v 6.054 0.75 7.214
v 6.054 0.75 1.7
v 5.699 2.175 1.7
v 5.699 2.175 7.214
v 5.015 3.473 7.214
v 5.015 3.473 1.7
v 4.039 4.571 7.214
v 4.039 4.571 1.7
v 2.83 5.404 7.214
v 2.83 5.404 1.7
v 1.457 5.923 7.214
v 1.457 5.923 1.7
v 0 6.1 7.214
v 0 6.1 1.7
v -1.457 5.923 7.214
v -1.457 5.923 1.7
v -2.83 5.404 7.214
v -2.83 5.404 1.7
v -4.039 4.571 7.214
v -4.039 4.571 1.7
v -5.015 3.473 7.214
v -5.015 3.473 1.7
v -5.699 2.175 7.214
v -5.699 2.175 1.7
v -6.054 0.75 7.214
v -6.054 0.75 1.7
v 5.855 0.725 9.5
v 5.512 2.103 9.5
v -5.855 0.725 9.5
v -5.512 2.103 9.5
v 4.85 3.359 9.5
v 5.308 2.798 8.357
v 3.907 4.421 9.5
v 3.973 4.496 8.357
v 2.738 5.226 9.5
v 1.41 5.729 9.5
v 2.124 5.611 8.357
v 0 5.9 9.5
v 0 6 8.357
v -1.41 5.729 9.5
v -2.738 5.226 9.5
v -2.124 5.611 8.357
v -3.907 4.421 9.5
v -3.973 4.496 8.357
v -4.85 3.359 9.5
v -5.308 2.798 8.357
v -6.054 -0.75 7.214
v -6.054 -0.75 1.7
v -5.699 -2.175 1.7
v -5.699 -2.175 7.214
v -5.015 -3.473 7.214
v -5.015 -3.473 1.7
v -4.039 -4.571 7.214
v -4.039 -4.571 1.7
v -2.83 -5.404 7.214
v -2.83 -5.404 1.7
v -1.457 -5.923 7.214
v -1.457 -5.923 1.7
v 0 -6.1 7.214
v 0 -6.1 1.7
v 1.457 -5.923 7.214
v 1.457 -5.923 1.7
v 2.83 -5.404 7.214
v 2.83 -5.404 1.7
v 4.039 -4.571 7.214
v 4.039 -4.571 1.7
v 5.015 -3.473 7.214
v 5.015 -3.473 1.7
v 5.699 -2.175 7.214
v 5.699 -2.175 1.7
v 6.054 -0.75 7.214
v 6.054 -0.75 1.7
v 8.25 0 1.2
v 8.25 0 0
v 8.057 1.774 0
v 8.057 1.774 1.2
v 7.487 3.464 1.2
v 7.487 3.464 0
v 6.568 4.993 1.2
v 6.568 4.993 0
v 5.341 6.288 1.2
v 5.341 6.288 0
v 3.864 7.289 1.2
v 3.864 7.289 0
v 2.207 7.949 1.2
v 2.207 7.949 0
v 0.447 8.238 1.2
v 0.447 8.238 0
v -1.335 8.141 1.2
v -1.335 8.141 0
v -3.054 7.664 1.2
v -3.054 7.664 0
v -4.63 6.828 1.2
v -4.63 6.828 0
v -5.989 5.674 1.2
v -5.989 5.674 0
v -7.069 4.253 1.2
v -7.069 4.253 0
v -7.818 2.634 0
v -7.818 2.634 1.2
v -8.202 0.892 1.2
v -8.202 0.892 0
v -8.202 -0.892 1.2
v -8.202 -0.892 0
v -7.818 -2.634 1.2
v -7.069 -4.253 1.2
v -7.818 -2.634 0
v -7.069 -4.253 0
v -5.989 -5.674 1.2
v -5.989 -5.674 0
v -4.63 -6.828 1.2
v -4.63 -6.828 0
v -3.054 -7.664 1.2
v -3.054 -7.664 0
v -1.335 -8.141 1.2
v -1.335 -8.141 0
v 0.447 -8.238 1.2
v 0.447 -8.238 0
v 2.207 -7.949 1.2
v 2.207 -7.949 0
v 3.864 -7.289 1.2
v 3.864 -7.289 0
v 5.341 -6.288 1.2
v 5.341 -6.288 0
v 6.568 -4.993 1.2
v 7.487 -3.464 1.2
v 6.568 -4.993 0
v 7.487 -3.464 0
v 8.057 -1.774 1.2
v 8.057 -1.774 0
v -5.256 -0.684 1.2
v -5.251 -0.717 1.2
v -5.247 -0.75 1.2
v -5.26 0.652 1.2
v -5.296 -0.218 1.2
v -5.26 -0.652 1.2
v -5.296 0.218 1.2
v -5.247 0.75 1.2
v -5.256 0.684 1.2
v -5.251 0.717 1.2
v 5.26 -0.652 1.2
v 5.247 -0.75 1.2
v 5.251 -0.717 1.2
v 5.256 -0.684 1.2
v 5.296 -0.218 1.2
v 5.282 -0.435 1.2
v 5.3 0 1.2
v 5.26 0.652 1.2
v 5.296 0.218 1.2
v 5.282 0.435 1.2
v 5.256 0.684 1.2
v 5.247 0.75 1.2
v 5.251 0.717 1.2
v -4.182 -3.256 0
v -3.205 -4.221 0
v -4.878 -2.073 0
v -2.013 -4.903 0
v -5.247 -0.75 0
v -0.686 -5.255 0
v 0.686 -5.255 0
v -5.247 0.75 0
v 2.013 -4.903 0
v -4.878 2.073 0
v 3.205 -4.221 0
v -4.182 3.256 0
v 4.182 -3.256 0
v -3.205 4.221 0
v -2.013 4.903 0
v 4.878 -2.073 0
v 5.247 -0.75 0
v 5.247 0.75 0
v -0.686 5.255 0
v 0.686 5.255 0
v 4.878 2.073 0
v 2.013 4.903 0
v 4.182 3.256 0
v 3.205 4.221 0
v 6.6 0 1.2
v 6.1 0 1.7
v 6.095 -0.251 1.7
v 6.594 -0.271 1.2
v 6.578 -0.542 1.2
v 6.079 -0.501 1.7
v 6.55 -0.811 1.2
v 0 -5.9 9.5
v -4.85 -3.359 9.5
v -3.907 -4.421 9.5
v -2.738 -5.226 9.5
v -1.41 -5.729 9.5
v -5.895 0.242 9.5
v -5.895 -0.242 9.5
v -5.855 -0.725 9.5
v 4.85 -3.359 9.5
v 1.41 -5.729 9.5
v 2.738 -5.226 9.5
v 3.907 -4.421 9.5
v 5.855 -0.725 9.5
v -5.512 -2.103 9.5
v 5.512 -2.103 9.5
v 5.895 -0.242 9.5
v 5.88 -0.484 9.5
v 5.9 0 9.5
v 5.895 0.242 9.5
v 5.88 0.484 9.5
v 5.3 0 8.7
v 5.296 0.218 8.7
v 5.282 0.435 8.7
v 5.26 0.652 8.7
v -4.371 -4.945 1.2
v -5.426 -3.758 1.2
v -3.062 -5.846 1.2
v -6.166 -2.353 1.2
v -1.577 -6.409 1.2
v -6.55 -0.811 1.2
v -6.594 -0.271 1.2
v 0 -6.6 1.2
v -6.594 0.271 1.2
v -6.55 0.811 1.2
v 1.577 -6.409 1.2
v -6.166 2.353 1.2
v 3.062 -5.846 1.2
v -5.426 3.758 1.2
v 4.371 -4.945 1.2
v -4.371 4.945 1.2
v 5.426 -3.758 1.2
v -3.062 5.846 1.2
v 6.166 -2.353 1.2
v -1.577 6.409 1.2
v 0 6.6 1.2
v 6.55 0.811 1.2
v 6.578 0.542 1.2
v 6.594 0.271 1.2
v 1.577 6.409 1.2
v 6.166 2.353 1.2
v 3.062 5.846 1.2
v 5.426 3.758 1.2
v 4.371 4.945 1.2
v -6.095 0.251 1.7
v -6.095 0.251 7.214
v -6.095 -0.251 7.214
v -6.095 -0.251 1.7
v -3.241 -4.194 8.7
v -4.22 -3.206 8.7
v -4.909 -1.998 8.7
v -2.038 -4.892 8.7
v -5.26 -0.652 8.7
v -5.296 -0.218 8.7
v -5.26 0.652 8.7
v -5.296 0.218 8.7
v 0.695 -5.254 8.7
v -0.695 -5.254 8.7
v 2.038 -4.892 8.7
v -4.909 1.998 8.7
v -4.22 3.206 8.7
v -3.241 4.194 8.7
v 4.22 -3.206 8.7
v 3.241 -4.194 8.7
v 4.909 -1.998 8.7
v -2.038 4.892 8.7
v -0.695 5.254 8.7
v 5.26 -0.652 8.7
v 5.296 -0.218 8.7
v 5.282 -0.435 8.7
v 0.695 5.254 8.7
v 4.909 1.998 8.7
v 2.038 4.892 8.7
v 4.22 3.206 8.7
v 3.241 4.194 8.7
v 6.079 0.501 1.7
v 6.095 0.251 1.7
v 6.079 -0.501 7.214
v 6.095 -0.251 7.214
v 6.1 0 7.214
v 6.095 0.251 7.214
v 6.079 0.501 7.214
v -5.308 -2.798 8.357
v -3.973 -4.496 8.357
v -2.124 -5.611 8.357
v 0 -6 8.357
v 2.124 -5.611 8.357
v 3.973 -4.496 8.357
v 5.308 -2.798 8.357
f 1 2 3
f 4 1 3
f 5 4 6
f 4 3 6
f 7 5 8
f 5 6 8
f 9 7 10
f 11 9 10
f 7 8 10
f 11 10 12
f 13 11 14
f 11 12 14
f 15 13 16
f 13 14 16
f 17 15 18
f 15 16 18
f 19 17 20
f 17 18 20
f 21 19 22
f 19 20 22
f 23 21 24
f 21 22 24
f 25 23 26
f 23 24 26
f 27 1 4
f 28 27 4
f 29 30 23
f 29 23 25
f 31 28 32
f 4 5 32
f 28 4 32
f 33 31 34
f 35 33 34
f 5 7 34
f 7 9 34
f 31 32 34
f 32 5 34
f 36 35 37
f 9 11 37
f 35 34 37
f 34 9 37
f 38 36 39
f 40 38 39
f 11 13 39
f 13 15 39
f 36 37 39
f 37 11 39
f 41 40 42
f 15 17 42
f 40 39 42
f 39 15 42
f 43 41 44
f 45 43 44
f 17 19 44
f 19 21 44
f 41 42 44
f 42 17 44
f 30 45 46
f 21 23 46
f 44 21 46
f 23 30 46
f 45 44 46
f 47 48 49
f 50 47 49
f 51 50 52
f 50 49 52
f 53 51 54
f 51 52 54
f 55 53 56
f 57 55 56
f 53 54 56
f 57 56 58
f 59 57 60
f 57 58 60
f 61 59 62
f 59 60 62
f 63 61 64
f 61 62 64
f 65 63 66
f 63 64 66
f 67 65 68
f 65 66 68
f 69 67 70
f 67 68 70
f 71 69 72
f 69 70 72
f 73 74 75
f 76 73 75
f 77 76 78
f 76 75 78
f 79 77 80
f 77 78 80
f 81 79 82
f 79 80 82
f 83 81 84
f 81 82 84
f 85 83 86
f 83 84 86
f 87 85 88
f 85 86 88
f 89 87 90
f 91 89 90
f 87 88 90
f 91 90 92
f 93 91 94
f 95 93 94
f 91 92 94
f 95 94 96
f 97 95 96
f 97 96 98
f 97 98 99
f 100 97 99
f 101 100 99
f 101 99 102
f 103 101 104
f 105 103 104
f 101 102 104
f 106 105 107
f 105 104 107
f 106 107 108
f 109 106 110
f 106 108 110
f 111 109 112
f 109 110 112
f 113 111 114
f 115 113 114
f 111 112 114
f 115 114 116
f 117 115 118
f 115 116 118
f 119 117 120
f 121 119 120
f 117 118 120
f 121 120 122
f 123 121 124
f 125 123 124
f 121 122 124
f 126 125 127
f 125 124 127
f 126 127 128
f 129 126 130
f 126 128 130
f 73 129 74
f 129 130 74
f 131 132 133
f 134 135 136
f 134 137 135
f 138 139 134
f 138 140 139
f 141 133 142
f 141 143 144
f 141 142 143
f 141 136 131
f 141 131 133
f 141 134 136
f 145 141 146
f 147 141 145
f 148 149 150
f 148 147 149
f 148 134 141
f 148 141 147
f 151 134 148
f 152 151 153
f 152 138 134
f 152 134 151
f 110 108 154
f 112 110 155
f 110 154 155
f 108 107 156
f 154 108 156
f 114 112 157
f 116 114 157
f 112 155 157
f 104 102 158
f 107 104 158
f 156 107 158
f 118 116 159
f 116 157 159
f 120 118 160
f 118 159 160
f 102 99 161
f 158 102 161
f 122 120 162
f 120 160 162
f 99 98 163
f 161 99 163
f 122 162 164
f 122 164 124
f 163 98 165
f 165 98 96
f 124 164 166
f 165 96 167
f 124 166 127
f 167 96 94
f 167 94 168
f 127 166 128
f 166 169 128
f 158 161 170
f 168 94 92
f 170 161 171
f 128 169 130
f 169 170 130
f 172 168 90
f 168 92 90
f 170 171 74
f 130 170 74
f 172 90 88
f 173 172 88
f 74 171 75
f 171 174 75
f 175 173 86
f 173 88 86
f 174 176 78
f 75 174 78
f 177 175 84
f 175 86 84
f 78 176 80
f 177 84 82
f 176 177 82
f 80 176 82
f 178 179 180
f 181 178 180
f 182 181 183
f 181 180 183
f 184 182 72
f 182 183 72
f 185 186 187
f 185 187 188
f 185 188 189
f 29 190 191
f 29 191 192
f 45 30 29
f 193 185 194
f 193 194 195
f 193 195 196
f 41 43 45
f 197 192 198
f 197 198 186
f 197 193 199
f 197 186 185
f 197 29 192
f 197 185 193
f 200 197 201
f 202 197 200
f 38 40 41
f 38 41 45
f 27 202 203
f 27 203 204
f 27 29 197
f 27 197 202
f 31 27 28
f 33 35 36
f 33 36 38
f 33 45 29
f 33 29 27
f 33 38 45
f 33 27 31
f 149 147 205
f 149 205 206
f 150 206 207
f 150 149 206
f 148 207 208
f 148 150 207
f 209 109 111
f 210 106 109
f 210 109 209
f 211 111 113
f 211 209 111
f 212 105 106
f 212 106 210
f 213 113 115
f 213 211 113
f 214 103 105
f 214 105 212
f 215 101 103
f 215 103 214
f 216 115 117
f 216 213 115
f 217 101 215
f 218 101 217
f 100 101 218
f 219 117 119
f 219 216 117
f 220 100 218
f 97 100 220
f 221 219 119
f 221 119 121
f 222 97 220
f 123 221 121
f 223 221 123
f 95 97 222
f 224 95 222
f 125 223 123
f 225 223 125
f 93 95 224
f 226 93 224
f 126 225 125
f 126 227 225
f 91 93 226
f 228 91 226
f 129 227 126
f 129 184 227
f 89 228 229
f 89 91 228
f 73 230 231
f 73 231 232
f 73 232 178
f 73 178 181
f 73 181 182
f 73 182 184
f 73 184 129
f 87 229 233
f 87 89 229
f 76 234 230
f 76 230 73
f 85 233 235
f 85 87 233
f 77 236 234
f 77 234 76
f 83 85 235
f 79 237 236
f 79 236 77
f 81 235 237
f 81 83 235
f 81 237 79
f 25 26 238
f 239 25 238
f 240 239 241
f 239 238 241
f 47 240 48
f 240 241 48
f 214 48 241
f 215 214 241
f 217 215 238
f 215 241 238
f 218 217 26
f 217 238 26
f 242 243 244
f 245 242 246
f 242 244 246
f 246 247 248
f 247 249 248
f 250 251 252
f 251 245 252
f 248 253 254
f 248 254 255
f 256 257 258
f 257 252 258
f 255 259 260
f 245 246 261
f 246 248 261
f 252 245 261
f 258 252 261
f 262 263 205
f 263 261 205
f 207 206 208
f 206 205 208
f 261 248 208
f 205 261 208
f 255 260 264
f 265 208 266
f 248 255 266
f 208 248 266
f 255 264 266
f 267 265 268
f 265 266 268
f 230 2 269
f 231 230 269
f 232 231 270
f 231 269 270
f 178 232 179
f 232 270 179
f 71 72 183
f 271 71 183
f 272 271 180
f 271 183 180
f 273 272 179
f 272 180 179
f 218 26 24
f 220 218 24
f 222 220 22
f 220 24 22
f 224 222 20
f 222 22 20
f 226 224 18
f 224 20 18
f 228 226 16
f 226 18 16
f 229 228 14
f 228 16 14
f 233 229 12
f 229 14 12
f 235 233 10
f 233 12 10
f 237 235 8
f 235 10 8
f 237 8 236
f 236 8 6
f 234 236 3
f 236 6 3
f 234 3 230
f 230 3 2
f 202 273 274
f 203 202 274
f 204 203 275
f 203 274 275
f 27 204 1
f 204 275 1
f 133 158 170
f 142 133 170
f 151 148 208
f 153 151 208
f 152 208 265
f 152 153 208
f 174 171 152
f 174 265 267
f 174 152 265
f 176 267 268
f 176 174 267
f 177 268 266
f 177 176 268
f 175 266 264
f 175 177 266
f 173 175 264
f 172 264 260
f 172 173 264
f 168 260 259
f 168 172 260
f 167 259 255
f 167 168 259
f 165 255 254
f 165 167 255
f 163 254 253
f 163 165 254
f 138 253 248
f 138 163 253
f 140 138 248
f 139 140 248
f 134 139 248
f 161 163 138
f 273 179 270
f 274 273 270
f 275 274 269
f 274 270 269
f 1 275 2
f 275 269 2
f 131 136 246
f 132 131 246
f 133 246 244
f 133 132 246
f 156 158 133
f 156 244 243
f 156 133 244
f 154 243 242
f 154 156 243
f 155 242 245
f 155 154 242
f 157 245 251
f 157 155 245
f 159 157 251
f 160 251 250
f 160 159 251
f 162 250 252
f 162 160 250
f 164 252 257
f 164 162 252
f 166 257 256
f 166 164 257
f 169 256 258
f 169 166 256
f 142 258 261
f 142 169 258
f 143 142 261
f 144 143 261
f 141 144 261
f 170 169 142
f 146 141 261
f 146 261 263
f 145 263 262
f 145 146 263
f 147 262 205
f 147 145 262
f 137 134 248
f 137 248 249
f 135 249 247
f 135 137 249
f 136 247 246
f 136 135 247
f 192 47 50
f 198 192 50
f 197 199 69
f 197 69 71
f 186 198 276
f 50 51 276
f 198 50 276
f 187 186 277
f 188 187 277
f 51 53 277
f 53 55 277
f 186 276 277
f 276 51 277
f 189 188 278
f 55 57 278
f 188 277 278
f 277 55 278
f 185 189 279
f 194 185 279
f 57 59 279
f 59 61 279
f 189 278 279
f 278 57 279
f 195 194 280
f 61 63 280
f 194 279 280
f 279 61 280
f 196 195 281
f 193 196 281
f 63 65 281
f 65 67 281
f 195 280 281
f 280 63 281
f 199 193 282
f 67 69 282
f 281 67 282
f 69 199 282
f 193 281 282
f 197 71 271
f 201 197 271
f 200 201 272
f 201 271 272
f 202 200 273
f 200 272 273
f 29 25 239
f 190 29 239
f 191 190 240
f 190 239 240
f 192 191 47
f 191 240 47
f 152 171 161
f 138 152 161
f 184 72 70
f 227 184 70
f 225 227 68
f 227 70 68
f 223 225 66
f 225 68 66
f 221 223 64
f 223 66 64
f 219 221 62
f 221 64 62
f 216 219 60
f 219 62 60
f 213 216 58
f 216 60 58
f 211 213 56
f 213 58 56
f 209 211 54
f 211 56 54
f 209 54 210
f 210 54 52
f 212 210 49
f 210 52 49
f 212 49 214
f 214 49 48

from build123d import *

# Parameters (mm, degrees)
F1_DEPTH = 9.5
F2_T     = -0.8
F0_R     = 8.25
F3_DEPTH = 1.2
F4_SIZE2 = 2.2860104606
F4_SIZE  = 0.2
F5_SIZE  = 0.5


with BuildPart() as f1:
    # F0 (on Top) → F1 (new body)
    with BuildSketch(Plane.XY):
        with BuildLine():
            ThreePointArc((6.0537178659, -0.75), (6.0884184721, -0.3757133335), (6.1, 0))
            ThreePointArc((6.1, 0), (6.0884184721, 0.3757133335), (6.0537178659, 0.75))
            Line((6.0537178659, 0.75), (-6.0537178659, 0.75))
            ThreePointArc((-6.0537178659, 0.75), (-6.1, 0), (-6.0537178659, -0.75))
            Line((-6.0537178659, -0.75), (6.0537178659, -0.75))
        make_face()
        with BuildLine():
            Line((-6.0537178659, 0.75), (6.0537178659, 0.75))
            ThreePointArc((6.0537178659, 0.75), (0, 6.1), (-6.0537178659, 0.75))
        make_face()
        with BuildLine():
            ThreePointArc((-6.0537178659, -0.75), (0, -6.1), (6.0537178659, -0.75))
            Line((6.0537178659, -0.75), (-6.0537178659, -0.75))
        make_face()
    extrude(amount=F1_DEPTH)

    # F2
    f2_openings = [f1.faces().sort_by_distance(p)[0] for p in [
        (0, 0, 0),
    ]]
    offset(amount=F2_T, openings=f2_openings)

    # F0 (on Top) → F3 (join)
    with BuildSketch(Plane.XY):
        Circle(F0_R)
        with BuildLine():
            ThreePointArc((-6.0537178659, 0.75), (0, 6.1), (6.0537178659, 0.75))
            Line((6.0537178659, 0.75), (7.5, 0.75))
            Line((7.5, 0.75), (7.5, -0.75))
            Line((7.5, -0.75), (6.0537178659, -0.75))
            ThreePointArc((6.0537178659, -0.75), (0, -6.1), (-6.0537178659, -0.75))
            Line((-6.0537178659, -0.75), (-7.5, -0.75))
            Line((-7.5, -0.75), (-7.5, 0.75))
            Line((-7.5, 0.75), (-6.0537178659, 0.75))
        make_face(mode=Mode.SUBTRACT)
        with BuildLine():
            ThreePointArc((6.0537178659, -0.75), (6.0884184721, -0.3757133335), (6.1, 0))
            ThreePointArc((6.1, 0), (6.0884184721, 0.3757133335), (6.0537178659, 0.75))
            Line((6.0537178659, 0.75), (-6.0537178659, 0.75))
            ThreePointArc((-6.0537178659, 0.75), (-6.1, 0), (-6.0537178659, -0.75))
            Line((-6.0537178659, -0.75), (6.0537178659, -0.75))
        make_face()
        with BuildLine():
            ThreePointArc((6.0537178659, 0.75), (6.0884184721, 0.3757133335), (6.1, 0))
            ThreePointArc((6.1, 0), (6.0884184721, -0.3757133335), (6.0537178659, -0.75))
            Line((6.0537178659, -0.75), (7.5, -0.75))
            Line((7.5, -0.75), (7.5, 0.75))
            Line((7.5, 0.75), (6.0537178659, 0.75))
        make_face()
        with BuildLine():
            ThreePointArc((-6.0537178659, -0.75), (-6.1, 0), (-6.0537178659, 0.75))
            Line((-6.0537178659, 0.75), (-7.5, 0.75))
            Line((-7.5, 0.75), (-7.5, -0.75))
            Line((-7.5, -0.75), (-6.0537178659, -0.75))
        make_face()
    extrude(amount=F3_DEPTH)

    # F4
    f4_edges = [f1.edges().sort_by_distance(p)[0] for p in [
        (6.053718, 0.75, 9.5),
    ]]
    f4_side = f1.faces().sort_by_distance((0, 0, 9.5))[0]
    chamfer(f4_edges, length=F4_SIZE, length2=F4_SIZE2, reference=f4_side)

    # F5
    f5_edges = [f1.edges().sort_by_distance(p)[0] for p in [
        (6.053718, 0.75, 1.2),
    ]]
    chamfer(f5_edges, length=F5_SIZE)


solid = f1.part
